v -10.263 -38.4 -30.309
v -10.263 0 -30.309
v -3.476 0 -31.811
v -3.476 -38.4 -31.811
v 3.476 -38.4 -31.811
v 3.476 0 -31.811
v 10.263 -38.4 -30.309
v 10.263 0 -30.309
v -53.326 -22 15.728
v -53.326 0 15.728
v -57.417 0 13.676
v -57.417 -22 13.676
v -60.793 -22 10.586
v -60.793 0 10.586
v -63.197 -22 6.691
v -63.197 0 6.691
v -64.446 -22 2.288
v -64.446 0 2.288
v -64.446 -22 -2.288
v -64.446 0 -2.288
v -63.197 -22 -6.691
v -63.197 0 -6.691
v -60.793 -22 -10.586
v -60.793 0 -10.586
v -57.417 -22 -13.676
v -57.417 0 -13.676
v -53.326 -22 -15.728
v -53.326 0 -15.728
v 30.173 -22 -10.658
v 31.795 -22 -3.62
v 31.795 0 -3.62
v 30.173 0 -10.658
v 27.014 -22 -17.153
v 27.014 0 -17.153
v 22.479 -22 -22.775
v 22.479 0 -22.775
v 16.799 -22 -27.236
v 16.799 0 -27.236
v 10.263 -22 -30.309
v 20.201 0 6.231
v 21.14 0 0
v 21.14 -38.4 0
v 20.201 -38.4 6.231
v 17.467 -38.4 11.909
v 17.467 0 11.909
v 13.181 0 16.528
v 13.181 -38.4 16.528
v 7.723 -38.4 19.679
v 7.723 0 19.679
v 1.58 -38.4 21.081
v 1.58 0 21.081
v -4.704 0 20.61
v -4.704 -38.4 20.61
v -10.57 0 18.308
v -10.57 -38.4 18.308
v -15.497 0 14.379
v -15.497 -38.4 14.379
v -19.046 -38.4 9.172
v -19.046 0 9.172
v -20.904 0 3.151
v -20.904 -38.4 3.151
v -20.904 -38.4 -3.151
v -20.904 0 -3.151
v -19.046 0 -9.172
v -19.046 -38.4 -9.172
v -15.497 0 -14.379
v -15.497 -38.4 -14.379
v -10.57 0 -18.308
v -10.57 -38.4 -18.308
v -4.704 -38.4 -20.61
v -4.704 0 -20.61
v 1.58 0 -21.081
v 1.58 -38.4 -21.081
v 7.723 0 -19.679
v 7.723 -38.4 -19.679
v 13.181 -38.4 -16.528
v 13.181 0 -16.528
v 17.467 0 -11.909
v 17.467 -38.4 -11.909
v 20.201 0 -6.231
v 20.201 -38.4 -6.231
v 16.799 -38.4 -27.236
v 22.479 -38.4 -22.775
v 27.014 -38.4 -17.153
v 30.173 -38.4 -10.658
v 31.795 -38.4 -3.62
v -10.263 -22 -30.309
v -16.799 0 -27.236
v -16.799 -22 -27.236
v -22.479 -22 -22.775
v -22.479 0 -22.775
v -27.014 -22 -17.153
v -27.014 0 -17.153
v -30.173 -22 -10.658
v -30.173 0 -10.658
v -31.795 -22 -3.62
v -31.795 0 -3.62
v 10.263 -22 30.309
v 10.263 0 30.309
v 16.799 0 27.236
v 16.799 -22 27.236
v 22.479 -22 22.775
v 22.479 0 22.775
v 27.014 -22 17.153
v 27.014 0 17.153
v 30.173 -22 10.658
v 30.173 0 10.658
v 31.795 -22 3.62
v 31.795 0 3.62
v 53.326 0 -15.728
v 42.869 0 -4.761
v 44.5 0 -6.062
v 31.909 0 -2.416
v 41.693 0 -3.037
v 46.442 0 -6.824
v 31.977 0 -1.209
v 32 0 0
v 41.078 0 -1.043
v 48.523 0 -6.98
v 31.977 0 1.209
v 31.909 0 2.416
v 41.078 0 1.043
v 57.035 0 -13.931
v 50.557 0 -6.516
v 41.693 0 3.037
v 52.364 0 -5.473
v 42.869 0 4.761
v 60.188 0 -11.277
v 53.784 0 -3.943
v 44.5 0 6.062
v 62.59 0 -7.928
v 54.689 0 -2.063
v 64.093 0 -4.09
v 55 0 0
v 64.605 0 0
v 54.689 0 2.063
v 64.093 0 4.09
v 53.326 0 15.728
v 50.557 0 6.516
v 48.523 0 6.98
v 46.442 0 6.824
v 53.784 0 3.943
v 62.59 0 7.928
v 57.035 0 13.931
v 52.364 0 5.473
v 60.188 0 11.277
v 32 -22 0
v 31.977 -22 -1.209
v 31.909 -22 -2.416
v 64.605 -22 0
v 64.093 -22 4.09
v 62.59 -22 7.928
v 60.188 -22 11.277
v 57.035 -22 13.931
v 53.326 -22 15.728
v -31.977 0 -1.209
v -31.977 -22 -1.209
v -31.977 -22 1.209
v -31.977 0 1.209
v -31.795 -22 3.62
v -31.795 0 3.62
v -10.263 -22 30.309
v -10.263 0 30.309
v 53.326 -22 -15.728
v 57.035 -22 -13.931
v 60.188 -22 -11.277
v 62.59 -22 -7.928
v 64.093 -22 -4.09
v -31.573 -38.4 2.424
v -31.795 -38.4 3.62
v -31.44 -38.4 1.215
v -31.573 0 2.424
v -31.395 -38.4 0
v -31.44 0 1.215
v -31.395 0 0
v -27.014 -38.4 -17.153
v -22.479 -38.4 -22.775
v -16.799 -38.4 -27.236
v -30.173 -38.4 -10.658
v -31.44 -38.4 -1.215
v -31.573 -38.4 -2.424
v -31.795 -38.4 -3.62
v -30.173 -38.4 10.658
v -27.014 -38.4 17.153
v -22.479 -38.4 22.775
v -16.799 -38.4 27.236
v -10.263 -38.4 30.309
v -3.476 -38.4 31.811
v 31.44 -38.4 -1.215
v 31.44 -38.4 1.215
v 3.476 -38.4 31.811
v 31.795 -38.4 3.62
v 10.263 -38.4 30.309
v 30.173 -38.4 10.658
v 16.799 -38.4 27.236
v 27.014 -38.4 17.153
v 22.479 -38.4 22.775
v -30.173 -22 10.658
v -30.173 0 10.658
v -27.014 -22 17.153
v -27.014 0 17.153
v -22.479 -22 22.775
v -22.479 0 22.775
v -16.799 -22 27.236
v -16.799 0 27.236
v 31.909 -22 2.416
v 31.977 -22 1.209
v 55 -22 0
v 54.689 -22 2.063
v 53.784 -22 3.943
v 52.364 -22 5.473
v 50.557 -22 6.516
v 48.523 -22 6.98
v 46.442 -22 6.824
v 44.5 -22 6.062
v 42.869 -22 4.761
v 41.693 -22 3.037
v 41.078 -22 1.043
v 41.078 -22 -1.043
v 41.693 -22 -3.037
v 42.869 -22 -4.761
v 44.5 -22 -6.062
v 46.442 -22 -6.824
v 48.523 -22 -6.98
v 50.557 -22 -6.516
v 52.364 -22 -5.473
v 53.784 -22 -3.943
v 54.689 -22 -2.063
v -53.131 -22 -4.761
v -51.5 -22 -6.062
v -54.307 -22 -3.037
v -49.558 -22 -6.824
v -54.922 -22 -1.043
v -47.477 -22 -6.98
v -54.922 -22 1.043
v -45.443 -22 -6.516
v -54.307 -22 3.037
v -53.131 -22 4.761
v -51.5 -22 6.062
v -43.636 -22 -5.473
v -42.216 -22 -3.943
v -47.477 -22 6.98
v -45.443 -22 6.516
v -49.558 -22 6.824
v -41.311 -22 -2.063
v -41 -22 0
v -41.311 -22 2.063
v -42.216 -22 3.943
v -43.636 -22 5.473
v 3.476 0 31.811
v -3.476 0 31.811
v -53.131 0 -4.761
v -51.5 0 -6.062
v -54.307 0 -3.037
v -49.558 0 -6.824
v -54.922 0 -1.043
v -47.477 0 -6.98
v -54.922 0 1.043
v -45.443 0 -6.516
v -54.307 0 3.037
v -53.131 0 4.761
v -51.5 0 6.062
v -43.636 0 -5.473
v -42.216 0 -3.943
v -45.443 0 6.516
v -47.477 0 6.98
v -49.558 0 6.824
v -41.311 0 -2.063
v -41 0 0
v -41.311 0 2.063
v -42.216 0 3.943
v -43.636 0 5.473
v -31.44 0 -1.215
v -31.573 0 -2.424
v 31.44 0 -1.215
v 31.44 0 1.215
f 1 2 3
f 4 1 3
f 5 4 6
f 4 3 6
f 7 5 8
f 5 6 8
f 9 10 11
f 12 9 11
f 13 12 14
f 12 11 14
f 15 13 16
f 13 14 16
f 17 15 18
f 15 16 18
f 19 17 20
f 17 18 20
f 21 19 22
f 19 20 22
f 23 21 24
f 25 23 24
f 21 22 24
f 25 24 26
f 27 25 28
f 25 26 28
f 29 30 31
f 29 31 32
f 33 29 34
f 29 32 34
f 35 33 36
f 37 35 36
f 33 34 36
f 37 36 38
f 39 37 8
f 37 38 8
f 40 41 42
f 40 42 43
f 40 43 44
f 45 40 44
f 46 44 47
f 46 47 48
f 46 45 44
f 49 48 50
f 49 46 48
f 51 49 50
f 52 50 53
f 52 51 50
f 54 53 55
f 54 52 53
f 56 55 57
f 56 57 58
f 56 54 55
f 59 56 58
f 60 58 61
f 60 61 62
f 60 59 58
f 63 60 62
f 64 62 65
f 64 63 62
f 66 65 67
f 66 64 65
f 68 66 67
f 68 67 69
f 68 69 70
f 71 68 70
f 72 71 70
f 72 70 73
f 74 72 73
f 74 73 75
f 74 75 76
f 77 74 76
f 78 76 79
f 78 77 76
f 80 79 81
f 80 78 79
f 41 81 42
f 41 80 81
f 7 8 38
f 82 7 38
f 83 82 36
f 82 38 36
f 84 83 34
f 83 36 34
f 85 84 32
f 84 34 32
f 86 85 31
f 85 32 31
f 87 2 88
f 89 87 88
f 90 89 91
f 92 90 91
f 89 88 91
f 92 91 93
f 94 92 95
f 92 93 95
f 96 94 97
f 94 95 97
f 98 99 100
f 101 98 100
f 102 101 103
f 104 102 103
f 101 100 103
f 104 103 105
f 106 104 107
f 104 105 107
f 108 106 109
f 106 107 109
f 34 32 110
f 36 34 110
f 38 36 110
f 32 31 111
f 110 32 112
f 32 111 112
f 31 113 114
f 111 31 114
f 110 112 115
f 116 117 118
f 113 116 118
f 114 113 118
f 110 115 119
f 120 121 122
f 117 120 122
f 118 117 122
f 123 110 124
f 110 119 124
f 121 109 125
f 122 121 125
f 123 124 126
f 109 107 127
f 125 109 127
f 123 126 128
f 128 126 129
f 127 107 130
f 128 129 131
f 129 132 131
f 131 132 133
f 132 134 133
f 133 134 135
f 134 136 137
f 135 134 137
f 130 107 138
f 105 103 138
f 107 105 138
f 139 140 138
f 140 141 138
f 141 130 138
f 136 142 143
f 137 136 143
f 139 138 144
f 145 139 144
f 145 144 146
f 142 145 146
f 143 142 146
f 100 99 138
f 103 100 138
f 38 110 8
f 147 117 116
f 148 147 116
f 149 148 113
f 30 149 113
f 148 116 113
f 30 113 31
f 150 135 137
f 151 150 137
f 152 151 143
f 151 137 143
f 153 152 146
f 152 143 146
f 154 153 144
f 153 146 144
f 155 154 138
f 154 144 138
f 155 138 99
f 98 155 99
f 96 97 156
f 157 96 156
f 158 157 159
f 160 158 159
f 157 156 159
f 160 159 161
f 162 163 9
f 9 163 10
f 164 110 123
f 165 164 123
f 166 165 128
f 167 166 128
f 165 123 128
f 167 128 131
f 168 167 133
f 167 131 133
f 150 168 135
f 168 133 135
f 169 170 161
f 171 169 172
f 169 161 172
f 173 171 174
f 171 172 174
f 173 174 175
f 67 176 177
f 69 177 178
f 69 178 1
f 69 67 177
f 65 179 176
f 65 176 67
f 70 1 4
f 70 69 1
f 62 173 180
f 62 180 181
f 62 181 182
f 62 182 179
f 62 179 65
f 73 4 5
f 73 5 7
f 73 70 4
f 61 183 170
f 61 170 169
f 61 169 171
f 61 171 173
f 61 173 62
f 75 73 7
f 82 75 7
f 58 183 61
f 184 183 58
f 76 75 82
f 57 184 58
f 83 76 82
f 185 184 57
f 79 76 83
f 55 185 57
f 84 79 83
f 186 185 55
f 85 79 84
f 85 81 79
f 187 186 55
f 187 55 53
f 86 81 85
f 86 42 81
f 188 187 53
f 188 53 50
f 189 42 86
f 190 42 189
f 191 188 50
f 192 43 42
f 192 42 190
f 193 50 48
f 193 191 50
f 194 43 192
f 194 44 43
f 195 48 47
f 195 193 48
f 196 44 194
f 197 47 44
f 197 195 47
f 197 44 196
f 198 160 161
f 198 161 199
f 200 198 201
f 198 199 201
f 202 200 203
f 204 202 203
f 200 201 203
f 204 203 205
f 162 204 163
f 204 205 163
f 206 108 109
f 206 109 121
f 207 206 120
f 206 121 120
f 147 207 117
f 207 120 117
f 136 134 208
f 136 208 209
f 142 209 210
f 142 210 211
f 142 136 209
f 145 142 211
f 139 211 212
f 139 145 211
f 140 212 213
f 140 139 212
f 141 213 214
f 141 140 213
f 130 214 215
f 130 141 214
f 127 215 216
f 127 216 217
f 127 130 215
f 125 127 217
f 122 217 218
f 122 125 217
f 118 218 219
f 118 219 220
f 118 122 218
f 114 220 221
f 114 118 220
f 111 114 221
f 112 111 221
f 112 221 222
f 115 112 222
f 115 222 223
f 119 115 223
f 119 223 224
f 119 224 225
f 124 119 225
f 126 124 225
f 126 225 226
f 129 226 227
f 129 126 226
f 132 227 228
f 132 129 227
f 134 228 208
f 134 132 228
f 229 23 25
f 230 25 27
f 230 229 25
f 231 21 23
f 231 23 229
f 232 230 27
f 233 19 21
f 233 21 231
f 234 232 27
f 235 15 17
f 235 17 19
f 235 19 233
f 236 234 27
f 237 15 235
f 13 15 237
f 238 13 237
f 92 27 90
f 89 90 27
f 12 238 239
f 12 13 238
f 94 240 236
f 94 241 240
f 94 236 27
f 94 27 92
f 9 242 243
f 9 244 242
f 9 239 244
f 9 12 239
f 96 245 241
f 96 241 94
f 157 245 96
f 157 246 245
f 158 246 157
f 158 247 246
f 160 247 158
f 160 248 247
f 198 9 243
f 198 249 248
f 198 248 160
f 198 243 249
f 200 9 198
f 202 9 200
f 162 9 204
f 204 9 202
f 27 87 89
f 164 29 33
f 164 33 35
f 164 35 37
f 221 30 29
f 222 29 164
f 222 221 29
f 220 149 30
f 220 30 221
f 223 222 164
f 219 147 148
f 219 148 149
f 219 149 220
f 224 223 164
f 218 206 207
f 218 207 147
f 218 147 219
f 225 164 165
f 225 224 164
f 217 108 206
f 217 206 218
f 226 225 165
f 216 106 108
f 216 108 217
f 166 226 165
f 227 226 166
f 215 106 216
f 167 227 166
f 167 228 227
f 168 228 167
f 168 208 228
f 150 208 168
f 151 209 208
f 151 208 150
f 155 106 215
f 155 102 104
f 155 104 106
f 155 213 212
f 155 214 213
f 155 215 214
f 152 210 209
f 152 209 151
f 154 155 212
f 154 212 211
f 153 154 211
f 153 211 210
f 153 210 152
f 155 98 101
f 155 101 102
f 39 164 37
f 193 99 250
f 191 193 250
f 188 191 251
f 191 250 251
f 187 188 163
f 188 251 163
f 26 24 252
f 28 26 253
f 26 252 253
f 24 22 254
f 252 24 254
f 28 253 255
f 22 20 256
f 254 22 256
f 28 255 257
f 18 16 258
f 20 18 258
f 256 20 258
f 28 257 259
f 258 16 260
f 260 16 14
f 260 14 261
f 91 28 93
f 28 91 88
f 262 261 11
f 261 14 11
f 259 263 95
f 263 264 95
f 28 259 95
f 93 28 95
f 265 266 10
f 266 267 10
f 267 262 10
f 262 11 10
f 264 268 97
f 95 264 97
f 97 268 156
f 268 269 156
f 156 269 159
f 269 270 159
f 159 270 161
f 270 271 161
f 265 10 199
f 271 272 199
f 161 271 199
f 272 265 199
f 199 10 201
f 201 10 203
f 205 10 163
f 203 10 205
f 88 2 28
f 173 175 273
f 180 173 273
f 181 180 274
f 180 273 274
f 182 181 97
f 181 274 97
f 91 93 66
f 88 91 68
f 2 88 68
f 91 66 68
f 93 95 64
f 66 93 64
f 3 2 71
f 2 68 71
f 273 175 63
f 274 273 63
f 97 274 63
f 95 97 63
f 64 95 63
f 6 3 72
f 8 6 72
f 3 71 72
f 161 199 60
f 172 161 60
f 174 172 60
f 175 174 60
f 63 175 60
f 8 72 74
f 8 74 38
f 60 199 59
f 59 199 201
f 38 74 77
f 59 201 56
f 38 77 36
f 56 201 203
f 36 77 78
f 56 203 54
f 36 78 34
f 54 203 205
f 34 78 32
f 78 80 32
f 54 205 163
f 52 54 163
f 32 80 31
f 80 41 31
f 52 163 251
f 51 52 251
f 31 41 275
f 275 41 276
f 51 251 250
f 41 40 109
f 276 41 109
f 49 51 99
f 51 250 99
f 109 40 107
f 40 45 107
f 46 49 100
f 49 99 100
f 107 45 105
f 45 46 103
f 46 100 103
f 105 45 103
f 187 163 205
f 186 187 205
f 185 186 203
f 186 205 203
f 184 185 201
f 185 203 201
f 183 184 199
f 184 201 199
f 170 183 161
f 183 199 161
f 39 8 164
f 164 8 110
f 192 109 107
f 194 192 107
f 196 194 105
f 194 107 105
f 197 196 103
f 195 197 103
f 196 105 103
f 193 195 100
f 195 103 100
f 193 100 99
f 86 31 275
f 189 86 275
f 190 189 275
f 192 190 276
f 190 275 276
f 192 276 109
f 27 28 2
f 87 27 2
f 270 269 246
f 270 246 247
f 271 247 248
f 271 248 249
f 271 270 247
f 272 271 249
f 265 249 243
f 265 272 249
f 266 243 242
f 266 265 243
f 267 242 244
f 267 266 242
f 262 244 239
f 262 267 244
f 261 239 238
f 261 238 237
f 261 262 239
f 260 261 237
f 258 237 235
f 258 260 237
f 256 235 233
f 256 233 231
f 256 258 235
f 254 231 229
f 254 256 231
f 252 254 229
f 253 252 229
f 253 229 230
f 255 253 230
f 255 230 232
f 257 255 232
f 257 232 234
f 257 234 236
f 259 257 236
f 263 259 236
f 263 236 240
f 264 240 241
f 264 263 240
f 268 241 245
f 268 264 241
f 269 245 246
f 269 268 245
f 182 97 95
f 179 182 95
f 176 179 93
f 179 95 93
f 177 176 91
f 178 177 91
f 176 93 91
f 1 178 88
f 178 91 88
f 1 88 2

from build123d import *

# Parameters (mm, degrees)
F0_R     = 7
F1_DEPTH = 22
F0_R_2   = 21.14
F2_DEPTH = 38.4


with BuildPart() as f1:
    # F0 (on Front) → F1 (new body)
    with BuildSketch(Plane.XZ):
        with BuildLine():
            ThreePointArc((-10.263392, -30.309451), (-24.90573, -20.092402), (-31.794551, -3.620296))
            ThreePointArc((-31.794551, -3.620296), (-39.861243, -14.473554), (-53.32571, -15.727681))
            Line((-53.32571, -15.727681), (-10.263392, -30.309451))
        make_face()
        with BuildLine():
            ThreePointArc((-31.794551, 3.620296), (-24.90573, 20.092402), (-10.263392, 30.309451))
            Line((-10.263392, 30.309451), (-53.32571, 15.727681))
            ThreePointArc((-53.32571, 15.727681), (-39.861243, 14.473554), (-31.794551, 3.620296))
        make_face()
        with BuildLine():
            Line((53.32571, 15.727681), (10.263392, 30.309451))
            ThreePointArc((10.263392, 30.309451), (24.90573, 20.092402), (31.794551, 3.620296))
            ThreePointArc((31.794551, 3.620296), (39.861243, 14.473554), (53.32571, 15.727681))
        make_face()
        with BuildLine():
            ThreePointArc((53.32571, 15.727681), (39.861243, 14.473554), (31.794551, 3.620296))
            ThreePointArc((31.794551, 3.620296), (31.948596, 1.81306), (32, 0))
            ThreePointArc((32, 0), (31.948596, -1.81306), (31.794551, -3.620296))
            ThreePointArc((31.794551, -3.620296), (39.861243, -14.473554), (53.32571, -15.727681))
            ThreePointArc((53.32571, -15.727681), (61.49363, -9.677039), (64.604913, 0))
            ThreePointArc((64.604913, 0), (61.49363, 9.677039), (53.32571, 15.727681))
        make_face()
        with Locations((48, 0)):
            Circle(F0_R, mode=Mode.SUBTRACT)
        with BuildLine():
            ThreePointArc((53.32571, -15.727681), (39.861243, -14.473554), (31.794551, -3.620296))
            ThreePointArc((31.794551, -3.620296), (24.90573, -20.092402), (10.263392, -30.309451))
            Line((10.263392, -30.309451), (53.32571, -15.727681))
        make_face()
        with BuildLine():
            ThreePointArc((-31.794551, -3.620296), (-32, 0), (-31.794551, 3.620296))
            ThreePointArc((-31.794551, 3.620296), (-39.861243, 14.473554), (-53.32571, 15.727681))
            ThreePointArc((-53.32571, 15.727681), (-64.604913, 0), (-53.32571, -15.727681))
            ThreePointArc((-53.32571, -15.727681), (-39.861243, -14.473554), (-31.794551, -3.620296))
        make_face()
        with Locations((-48, 0)):
            Circle(F0_R, mode=Mode.SUBTRACT)
    extrude(amount=F1_DEPTH)


with BuildPart() as f2:
    # F0 (on Front) → F2 (new body)
    with BuildSketch(Plane.XZ):
        with BuildLine():
            ThreePointArc((31.794551, 3.620296), (24.90573, 20.092402), (10.263392, 30.309451))
            ThreePointArc((10.263392, 30.309451), (0, 32), (-10.263392, 30.309451))
            ThreePointArc((-10.263392, 30.309451), (-24.90573, 20.092402), (-31.794551, 3.620296))
            ThreePointArc((-31.794551, 3.620296), (-31.495255, 1.821134), (-31.395087, 0))
            ThreePointArc((-31.395087, 0), (-31.495255, -1.821134), (-31.794551, -3.620296))
            ThreePointArc((-31.794551, -3.620296), (-24.90573, -20.092402), (-10.263392, -30.309451))
            ThreePointArc((-10.263392, -30.309451), (0, -32), (10.263392, -30.309451))
            ThreePointArc((10.263392, -30.309451), (24.90573, -20.092402), (31.794551, -3.620296))
            ThreePointArc((31.794551, -3.620296), (31.395087, 0), (31.794551, 3.620296))
        make_face()
        Circle(F0_R_2, mode=Mode.SUBTRACT)
    extrude(amount=F2_DEPTH)


solid = Compound([f1.part, f2.part])
